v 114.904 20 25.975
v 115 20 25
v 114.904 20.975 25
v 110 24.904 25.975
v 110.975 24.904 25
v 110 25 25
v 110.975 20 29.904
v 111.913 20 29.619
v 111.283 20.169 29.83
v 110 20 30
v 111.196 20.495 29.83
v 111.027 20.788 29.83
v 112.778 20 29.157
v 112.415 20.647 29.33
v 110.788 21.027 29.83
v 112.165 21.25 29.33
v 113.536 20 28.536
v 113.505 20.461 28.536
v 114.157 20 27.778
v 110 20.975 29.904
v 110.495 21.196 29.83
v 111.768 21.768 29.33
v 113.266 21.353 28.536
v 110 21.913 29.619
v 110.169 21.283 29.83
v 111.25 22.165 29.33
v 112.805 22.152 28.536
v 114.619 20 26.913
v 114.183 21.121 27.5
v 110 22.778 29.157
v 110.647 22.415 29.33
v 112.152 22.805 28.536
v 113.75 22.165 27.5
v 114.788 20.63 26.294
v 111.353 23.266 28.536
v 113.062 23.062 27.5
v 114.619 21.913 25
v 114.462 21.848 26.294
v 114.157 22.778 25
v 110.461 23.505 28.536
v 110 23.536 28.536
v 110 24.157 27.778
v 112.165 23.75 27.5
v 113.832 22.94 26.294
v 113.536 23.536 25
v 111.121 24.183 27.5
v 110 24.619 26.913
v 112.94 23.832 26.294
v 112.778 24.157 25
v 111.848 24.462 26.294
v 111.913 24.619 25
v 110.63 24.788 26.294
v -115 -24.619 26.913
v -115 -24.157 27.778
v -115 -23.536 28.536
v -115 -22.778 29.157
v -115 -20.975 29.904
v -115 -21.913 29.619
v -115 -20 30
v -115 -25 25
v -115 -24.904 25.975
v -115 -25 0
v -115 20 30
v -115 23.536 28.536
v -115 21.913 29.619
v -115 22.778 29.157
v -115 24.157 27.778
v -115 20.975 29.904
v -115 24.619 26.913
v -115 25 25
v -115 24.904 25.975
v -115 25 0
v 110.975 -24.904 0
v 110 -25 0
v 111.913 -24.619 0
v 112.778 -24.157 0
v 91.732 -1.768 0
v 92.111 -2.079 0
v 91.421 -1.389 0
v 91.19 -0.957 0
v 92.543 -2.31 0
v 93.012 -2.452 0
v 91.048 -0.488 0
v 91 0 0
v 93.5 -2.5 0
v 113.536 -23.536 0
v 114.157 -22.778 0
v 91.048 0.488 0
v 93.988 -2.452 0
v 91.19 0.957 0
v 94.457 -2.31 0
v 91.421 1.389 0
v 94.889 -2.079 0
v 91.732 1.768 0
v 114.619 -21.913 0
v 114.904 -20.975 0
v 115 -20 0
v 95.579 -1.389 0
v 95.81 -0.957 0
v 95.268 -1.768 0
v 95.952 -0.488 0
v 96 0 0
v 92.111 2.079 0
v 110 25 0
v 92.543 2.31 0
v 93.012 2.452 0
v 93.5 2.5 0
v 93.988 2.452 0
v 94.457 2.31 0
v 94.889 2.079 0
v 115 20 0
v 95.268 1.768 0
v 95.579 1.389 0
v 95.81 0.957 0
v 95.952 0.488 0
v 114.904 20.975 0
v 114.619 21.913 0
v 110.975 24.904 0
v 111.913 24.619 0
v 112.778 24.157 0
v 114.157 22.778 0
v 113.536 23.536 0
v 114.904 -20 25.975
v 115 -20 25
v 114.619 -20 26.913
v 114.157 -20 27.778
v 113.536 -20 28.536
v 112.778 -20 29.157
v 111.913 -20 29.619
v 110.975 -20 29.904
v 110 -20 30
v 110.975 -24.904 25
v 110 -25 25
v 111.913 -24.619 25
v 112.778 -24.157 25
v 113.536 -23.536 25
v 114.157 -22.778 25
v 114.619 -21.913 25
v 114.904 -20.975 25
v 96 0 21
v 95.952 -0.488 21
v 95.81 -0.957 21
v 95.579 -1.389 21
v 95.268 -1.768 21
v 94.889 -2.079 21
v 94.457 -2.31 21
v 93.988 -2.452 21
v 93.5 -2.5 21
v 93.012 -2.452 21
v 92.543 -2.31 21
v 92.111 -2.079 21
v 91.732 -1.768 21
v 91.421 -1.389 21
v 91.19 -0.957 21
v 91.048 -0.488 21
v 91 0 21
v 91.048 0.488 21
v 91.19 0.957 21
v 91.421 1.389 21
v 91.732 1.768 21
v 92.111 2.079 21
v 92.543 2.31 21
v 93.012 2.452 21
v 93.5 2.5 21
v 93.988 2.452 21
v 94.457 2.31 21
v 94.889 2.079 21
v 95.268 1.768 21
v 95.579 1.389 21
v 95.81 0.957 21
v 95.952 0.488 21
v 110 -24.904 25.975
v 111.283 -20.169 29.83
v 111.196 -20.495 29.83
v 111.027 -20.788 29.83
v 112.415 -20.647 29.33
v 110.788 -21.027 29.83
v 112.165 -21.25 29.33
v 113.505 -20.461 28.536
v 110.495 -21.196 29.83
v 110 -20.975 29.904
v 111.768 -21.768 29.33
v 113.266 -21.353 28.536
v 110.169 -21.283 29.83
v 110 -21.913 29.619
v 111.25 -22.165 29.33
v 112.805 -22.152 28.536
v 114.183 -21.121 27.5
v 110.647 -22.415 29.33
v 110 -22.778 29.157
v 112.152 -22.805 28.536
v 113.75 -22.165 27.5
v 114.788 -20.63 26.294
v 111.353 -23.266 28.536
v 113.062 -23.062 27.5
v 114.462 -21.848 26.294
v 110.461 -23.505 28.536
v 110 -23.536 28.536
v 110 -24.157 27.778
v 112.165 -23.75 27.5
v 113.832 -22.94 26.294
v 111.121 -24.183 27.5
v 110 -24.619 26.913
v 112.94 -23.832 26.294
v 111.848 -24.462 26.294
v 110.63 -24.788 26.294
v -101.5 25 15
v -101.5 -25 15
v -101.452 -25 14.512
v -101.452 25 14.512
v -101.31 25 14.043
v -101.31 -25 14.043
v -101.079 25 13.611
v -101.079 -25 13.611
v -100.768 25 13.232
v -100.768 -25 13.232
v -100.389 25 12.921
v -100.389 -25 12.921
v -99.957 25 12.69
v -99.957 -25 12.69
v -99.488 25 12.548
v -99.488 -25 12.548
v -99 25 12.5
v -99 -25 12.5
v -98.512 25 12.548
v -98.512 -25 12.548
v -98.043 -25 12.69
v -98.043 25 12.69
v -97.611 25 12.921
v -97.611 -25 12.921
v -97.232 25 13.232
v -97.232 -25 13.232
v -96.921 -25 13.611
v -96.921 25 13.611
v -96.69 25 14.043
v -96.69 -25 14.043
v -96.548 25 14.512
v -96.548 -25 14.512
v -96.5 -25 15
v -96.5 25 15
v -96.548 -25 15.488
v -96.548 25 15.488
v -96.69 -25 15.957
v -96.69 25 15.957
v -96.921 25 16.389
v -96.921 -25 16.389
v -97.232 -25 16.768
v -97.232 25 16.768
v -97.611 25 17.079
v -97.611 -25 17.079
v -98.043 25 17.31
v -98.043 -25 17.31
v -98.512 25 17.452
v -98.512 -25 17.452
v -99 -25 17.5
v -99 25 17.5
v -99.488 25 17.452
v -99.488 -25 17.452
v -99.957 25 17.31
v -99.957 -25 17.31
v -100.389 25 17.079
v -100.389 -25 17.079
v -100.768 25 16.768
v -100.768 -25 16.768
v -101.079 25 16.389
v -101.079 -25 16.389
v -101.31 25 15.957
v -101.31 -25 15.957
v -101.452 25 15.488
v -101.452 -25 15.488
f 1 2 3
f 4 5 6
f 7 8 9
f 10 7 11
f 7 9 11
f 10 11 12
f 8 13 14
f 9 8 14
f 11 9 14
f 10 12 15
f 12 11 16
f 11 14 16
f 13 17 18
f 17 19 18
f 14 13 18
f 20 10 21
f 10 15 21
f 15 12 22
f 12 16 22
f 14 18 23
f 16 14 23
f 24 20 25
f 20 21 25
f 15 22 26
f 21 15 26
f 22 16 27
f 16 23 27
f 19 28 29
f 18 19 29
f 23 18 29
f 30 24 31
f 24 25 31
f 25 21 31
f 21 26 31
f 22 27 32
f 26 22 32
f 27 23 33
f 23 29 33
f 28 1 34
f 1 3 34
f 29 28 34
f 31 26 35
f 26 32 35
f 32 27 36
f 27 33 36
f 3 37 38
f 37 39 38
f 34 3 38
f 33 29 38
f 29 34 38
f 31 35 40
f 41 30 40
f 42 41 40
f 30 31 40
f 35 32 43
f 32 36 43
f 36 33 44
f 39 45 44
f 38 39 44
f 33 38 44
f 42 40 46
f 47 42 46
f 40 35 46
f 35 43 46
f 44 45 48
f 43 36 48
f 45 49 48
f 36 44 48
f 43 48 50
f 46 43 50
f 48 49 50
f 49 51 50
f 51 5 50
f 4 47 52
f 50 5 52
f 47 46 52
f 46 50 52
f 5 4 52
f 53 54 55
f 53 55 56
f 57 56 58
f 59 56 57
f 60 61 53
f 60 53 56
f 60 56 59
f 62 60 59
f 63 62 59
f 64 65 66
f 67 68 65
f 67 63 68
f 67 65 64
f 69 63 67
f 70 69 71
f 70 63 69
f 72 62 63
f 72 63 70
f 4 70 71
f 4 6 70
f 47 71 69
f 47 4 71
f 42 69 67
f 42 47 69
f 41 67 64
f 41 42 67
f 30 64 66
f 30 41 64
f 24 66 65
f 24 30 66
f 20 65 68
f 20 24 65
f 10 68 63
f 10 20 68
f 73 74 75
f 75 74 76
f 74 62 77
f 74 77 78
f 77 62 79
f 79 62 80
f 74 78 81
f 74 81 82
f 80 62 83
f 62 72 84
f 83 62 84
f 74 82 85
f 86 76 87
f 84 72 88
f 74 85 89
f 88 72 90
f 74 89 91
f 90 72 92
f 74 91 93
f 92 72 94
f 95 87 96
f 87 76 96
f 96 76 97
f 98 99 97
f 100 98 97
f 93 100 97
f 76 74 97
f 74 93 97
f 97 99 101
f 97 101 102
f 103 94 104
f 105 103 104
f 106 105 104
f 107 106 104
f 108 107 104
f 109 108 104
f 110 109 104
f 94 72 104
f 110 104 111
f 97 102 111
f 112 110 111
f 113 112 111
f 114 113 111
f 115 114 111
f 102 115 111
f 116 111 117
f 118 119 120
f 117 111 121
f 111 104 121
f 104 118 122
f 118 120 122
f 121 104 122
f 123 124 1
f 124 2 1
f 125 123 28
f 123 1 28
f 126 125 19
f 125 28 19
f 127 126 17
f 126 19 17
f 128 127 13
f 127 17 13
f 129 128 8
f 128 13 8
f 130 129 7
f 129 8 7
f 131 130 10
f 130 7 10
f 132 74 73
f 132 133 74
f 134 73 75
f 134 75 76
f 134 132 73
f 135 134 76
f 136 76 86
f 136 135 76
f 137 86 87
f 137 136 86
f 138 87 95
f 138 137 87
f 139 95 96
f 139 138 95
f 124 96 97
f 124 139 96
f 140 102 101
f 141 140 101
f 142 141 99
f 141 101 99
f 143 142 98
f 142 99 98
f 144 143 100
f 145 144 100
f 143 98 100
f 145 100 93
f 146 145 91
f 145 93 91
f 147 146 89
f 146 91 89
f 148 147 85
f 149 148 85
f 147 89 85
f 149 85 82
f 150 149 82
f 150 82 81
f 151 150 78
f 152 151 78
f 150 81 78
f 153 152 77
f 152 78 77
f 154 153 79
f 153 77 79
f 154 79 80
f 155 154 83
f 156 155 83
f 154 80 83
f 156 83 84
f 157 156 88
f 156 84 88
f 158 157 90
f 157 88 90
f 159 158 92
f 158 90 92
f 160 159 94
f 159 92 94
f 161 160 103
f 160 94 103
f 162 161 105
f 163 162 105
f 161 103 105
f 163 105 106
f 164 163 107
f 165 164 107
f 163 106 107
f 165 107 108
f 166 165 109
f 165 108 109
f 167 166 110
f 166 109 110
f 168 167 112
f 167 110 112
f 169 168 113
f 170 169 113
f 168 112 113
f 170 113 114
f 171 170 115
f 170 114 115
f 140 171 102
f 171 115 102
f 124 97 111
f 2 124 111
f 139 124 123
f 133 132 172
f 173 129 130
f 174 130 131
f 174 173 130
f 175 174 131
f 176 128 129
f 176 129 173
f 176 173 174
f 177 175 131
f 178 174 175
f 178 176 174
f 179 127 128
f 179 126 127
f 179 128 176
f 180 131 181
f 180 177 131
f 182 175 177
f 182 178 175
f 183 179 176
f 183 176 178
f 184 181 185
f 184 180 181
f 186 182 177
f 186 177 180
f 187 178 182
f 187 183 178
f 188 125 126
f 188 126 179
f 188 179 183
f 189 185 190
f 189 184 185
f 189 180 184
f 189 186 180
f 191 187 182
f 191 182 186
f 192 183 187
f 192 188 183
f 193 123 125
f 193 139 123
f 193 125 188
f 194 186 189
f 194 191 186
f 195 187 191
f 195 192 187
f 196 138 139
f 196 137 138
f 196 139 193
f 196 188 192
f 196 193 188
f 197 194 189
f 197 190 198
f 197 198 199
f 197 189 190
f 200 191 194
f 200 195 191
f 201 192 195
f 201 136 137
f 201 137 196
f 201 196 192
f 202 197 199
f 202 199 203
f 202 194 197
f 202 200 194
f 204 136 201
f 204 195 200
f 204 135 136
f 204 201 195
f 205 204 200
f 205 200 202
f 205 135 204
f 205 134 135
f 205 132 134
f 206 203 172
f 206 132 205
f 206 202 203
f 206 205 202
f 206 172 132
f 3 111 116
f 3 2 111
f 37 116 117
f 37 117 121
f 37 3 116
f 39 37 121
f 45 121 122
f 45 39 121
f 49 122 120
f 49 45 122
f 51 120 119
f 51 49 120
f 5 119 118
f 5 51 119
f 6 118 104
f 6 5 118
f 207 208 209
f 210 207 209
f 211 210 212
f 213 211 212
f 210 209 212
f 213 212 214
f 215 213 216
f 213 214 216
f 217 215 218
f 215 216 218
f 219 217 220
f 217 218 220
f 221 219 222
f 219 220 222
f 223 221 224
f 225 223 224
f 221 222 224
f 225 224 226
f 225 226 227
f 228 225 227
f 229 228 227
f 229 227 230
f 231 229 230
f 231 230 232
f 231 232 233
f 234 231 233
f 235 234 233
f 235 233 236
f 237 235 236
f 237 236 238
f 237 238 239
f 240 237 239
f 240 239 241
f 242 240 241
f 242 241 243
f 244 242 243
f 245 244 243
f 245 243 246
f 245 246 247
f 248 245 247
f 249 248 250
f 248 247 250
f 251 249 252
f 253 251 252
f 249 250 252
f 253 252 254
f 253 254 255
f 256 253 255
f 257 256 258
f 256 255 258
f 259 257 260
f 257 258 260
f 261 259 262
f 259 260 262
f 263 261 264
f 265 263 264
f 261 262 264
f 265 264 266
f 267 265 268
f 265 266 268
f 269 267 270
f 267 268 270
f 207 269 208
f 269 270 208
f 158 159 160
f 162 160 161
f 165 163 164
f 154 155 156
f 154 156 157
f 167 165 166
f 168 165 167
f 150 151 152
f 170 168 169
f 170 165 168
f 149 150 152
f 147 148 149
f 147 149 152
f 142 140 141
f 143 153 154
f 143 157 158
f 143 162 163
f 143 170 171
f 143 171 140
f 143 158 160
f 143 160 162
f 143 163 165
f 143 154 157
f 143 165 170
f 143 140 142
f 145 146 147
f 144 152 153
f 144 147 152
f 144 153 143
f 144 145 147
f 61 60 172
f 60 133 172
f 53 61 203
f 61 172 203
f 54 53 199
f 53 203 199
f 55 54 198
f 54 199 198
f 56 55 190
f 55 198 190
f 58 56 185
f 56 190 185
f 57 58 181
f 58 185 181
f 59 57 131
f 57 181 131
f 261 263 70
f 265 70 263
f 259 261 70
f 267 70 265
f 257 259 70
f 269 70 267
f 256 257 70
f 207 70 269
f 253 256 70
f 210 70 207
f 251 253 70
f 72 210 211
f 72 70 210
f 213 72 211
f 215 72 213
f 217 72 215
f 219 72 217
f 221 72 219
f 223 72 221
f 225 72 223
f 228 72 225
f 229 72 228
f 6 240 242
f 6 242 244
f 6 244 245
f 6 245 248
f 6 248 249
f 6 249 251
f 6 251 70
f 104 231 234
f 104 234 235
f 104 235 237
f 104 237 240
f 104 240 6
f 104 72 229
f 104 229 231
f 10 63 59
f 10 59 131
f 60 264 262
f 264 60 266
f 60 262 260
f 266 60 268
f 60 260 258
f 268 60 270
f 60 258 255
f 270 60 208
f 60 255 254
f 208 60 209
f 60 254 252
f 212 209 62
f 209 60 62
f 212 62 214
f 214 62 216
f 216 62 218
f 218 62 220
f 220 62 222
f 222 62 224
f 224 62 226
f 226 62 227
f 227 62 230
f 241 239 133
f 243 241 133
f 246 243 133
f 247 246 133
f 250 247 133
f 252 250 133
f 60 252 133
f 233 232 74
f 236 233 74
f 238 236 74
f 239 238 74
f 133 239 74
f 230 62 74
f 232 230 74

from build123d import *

# Parameters (mm, degrees)
F0_W     = 230
F0_H     = 50
F1_DEPTH = 30
F2_R     = 5
F4_DEPTH = 76.7
F5_R     = 2.5
F6_DEPTH = 21


with BuildPart() as f1:
    # F0 (on Top) → F1 (new body)
    with BuildSketch(Plane.XY):
        Rectangle(F0_W, F0_H)
    extrude(amount=F1_DEPTH)

    # F2
    f2_edges = [f1.edges().sort_by_distance(p)[0] for p in [
        (115, -25, 15),
        (115, 25, 15),
        (115, 0, 30),
        (0, 25, 30),
        (0, -25, 30),
    ]]
    fillet(f2_edges, radius=F2_R)

    # F3 (on face) → F4 (cut)
    with BuildSketch(Plane.XZ.offset(25)):
        with BuildLine():
            ThreePointArc((-96.5, 15), (-99, 17.5), (-101.5, 15))
            ThreePointArc((-101.5, 15), (-99, 12.5), (-96.5, 15))
        make_face()
    extrude(amount=-F4_DEPTH, mode=Mode.SUBTRACT)

    # F5 (on face) → F6 (cut)
    with BuildSketch(Plane(origin=(0, 0, 0), x_dir=(1, 0, 0), z_dir=(0, 0, -1))):
        with Locations((93.5, 0)):
            Circle(F5_R)
    extrude(amount=-F6_DEPTH, mode=Mode.SUBTRACT)


solid = f1.part
